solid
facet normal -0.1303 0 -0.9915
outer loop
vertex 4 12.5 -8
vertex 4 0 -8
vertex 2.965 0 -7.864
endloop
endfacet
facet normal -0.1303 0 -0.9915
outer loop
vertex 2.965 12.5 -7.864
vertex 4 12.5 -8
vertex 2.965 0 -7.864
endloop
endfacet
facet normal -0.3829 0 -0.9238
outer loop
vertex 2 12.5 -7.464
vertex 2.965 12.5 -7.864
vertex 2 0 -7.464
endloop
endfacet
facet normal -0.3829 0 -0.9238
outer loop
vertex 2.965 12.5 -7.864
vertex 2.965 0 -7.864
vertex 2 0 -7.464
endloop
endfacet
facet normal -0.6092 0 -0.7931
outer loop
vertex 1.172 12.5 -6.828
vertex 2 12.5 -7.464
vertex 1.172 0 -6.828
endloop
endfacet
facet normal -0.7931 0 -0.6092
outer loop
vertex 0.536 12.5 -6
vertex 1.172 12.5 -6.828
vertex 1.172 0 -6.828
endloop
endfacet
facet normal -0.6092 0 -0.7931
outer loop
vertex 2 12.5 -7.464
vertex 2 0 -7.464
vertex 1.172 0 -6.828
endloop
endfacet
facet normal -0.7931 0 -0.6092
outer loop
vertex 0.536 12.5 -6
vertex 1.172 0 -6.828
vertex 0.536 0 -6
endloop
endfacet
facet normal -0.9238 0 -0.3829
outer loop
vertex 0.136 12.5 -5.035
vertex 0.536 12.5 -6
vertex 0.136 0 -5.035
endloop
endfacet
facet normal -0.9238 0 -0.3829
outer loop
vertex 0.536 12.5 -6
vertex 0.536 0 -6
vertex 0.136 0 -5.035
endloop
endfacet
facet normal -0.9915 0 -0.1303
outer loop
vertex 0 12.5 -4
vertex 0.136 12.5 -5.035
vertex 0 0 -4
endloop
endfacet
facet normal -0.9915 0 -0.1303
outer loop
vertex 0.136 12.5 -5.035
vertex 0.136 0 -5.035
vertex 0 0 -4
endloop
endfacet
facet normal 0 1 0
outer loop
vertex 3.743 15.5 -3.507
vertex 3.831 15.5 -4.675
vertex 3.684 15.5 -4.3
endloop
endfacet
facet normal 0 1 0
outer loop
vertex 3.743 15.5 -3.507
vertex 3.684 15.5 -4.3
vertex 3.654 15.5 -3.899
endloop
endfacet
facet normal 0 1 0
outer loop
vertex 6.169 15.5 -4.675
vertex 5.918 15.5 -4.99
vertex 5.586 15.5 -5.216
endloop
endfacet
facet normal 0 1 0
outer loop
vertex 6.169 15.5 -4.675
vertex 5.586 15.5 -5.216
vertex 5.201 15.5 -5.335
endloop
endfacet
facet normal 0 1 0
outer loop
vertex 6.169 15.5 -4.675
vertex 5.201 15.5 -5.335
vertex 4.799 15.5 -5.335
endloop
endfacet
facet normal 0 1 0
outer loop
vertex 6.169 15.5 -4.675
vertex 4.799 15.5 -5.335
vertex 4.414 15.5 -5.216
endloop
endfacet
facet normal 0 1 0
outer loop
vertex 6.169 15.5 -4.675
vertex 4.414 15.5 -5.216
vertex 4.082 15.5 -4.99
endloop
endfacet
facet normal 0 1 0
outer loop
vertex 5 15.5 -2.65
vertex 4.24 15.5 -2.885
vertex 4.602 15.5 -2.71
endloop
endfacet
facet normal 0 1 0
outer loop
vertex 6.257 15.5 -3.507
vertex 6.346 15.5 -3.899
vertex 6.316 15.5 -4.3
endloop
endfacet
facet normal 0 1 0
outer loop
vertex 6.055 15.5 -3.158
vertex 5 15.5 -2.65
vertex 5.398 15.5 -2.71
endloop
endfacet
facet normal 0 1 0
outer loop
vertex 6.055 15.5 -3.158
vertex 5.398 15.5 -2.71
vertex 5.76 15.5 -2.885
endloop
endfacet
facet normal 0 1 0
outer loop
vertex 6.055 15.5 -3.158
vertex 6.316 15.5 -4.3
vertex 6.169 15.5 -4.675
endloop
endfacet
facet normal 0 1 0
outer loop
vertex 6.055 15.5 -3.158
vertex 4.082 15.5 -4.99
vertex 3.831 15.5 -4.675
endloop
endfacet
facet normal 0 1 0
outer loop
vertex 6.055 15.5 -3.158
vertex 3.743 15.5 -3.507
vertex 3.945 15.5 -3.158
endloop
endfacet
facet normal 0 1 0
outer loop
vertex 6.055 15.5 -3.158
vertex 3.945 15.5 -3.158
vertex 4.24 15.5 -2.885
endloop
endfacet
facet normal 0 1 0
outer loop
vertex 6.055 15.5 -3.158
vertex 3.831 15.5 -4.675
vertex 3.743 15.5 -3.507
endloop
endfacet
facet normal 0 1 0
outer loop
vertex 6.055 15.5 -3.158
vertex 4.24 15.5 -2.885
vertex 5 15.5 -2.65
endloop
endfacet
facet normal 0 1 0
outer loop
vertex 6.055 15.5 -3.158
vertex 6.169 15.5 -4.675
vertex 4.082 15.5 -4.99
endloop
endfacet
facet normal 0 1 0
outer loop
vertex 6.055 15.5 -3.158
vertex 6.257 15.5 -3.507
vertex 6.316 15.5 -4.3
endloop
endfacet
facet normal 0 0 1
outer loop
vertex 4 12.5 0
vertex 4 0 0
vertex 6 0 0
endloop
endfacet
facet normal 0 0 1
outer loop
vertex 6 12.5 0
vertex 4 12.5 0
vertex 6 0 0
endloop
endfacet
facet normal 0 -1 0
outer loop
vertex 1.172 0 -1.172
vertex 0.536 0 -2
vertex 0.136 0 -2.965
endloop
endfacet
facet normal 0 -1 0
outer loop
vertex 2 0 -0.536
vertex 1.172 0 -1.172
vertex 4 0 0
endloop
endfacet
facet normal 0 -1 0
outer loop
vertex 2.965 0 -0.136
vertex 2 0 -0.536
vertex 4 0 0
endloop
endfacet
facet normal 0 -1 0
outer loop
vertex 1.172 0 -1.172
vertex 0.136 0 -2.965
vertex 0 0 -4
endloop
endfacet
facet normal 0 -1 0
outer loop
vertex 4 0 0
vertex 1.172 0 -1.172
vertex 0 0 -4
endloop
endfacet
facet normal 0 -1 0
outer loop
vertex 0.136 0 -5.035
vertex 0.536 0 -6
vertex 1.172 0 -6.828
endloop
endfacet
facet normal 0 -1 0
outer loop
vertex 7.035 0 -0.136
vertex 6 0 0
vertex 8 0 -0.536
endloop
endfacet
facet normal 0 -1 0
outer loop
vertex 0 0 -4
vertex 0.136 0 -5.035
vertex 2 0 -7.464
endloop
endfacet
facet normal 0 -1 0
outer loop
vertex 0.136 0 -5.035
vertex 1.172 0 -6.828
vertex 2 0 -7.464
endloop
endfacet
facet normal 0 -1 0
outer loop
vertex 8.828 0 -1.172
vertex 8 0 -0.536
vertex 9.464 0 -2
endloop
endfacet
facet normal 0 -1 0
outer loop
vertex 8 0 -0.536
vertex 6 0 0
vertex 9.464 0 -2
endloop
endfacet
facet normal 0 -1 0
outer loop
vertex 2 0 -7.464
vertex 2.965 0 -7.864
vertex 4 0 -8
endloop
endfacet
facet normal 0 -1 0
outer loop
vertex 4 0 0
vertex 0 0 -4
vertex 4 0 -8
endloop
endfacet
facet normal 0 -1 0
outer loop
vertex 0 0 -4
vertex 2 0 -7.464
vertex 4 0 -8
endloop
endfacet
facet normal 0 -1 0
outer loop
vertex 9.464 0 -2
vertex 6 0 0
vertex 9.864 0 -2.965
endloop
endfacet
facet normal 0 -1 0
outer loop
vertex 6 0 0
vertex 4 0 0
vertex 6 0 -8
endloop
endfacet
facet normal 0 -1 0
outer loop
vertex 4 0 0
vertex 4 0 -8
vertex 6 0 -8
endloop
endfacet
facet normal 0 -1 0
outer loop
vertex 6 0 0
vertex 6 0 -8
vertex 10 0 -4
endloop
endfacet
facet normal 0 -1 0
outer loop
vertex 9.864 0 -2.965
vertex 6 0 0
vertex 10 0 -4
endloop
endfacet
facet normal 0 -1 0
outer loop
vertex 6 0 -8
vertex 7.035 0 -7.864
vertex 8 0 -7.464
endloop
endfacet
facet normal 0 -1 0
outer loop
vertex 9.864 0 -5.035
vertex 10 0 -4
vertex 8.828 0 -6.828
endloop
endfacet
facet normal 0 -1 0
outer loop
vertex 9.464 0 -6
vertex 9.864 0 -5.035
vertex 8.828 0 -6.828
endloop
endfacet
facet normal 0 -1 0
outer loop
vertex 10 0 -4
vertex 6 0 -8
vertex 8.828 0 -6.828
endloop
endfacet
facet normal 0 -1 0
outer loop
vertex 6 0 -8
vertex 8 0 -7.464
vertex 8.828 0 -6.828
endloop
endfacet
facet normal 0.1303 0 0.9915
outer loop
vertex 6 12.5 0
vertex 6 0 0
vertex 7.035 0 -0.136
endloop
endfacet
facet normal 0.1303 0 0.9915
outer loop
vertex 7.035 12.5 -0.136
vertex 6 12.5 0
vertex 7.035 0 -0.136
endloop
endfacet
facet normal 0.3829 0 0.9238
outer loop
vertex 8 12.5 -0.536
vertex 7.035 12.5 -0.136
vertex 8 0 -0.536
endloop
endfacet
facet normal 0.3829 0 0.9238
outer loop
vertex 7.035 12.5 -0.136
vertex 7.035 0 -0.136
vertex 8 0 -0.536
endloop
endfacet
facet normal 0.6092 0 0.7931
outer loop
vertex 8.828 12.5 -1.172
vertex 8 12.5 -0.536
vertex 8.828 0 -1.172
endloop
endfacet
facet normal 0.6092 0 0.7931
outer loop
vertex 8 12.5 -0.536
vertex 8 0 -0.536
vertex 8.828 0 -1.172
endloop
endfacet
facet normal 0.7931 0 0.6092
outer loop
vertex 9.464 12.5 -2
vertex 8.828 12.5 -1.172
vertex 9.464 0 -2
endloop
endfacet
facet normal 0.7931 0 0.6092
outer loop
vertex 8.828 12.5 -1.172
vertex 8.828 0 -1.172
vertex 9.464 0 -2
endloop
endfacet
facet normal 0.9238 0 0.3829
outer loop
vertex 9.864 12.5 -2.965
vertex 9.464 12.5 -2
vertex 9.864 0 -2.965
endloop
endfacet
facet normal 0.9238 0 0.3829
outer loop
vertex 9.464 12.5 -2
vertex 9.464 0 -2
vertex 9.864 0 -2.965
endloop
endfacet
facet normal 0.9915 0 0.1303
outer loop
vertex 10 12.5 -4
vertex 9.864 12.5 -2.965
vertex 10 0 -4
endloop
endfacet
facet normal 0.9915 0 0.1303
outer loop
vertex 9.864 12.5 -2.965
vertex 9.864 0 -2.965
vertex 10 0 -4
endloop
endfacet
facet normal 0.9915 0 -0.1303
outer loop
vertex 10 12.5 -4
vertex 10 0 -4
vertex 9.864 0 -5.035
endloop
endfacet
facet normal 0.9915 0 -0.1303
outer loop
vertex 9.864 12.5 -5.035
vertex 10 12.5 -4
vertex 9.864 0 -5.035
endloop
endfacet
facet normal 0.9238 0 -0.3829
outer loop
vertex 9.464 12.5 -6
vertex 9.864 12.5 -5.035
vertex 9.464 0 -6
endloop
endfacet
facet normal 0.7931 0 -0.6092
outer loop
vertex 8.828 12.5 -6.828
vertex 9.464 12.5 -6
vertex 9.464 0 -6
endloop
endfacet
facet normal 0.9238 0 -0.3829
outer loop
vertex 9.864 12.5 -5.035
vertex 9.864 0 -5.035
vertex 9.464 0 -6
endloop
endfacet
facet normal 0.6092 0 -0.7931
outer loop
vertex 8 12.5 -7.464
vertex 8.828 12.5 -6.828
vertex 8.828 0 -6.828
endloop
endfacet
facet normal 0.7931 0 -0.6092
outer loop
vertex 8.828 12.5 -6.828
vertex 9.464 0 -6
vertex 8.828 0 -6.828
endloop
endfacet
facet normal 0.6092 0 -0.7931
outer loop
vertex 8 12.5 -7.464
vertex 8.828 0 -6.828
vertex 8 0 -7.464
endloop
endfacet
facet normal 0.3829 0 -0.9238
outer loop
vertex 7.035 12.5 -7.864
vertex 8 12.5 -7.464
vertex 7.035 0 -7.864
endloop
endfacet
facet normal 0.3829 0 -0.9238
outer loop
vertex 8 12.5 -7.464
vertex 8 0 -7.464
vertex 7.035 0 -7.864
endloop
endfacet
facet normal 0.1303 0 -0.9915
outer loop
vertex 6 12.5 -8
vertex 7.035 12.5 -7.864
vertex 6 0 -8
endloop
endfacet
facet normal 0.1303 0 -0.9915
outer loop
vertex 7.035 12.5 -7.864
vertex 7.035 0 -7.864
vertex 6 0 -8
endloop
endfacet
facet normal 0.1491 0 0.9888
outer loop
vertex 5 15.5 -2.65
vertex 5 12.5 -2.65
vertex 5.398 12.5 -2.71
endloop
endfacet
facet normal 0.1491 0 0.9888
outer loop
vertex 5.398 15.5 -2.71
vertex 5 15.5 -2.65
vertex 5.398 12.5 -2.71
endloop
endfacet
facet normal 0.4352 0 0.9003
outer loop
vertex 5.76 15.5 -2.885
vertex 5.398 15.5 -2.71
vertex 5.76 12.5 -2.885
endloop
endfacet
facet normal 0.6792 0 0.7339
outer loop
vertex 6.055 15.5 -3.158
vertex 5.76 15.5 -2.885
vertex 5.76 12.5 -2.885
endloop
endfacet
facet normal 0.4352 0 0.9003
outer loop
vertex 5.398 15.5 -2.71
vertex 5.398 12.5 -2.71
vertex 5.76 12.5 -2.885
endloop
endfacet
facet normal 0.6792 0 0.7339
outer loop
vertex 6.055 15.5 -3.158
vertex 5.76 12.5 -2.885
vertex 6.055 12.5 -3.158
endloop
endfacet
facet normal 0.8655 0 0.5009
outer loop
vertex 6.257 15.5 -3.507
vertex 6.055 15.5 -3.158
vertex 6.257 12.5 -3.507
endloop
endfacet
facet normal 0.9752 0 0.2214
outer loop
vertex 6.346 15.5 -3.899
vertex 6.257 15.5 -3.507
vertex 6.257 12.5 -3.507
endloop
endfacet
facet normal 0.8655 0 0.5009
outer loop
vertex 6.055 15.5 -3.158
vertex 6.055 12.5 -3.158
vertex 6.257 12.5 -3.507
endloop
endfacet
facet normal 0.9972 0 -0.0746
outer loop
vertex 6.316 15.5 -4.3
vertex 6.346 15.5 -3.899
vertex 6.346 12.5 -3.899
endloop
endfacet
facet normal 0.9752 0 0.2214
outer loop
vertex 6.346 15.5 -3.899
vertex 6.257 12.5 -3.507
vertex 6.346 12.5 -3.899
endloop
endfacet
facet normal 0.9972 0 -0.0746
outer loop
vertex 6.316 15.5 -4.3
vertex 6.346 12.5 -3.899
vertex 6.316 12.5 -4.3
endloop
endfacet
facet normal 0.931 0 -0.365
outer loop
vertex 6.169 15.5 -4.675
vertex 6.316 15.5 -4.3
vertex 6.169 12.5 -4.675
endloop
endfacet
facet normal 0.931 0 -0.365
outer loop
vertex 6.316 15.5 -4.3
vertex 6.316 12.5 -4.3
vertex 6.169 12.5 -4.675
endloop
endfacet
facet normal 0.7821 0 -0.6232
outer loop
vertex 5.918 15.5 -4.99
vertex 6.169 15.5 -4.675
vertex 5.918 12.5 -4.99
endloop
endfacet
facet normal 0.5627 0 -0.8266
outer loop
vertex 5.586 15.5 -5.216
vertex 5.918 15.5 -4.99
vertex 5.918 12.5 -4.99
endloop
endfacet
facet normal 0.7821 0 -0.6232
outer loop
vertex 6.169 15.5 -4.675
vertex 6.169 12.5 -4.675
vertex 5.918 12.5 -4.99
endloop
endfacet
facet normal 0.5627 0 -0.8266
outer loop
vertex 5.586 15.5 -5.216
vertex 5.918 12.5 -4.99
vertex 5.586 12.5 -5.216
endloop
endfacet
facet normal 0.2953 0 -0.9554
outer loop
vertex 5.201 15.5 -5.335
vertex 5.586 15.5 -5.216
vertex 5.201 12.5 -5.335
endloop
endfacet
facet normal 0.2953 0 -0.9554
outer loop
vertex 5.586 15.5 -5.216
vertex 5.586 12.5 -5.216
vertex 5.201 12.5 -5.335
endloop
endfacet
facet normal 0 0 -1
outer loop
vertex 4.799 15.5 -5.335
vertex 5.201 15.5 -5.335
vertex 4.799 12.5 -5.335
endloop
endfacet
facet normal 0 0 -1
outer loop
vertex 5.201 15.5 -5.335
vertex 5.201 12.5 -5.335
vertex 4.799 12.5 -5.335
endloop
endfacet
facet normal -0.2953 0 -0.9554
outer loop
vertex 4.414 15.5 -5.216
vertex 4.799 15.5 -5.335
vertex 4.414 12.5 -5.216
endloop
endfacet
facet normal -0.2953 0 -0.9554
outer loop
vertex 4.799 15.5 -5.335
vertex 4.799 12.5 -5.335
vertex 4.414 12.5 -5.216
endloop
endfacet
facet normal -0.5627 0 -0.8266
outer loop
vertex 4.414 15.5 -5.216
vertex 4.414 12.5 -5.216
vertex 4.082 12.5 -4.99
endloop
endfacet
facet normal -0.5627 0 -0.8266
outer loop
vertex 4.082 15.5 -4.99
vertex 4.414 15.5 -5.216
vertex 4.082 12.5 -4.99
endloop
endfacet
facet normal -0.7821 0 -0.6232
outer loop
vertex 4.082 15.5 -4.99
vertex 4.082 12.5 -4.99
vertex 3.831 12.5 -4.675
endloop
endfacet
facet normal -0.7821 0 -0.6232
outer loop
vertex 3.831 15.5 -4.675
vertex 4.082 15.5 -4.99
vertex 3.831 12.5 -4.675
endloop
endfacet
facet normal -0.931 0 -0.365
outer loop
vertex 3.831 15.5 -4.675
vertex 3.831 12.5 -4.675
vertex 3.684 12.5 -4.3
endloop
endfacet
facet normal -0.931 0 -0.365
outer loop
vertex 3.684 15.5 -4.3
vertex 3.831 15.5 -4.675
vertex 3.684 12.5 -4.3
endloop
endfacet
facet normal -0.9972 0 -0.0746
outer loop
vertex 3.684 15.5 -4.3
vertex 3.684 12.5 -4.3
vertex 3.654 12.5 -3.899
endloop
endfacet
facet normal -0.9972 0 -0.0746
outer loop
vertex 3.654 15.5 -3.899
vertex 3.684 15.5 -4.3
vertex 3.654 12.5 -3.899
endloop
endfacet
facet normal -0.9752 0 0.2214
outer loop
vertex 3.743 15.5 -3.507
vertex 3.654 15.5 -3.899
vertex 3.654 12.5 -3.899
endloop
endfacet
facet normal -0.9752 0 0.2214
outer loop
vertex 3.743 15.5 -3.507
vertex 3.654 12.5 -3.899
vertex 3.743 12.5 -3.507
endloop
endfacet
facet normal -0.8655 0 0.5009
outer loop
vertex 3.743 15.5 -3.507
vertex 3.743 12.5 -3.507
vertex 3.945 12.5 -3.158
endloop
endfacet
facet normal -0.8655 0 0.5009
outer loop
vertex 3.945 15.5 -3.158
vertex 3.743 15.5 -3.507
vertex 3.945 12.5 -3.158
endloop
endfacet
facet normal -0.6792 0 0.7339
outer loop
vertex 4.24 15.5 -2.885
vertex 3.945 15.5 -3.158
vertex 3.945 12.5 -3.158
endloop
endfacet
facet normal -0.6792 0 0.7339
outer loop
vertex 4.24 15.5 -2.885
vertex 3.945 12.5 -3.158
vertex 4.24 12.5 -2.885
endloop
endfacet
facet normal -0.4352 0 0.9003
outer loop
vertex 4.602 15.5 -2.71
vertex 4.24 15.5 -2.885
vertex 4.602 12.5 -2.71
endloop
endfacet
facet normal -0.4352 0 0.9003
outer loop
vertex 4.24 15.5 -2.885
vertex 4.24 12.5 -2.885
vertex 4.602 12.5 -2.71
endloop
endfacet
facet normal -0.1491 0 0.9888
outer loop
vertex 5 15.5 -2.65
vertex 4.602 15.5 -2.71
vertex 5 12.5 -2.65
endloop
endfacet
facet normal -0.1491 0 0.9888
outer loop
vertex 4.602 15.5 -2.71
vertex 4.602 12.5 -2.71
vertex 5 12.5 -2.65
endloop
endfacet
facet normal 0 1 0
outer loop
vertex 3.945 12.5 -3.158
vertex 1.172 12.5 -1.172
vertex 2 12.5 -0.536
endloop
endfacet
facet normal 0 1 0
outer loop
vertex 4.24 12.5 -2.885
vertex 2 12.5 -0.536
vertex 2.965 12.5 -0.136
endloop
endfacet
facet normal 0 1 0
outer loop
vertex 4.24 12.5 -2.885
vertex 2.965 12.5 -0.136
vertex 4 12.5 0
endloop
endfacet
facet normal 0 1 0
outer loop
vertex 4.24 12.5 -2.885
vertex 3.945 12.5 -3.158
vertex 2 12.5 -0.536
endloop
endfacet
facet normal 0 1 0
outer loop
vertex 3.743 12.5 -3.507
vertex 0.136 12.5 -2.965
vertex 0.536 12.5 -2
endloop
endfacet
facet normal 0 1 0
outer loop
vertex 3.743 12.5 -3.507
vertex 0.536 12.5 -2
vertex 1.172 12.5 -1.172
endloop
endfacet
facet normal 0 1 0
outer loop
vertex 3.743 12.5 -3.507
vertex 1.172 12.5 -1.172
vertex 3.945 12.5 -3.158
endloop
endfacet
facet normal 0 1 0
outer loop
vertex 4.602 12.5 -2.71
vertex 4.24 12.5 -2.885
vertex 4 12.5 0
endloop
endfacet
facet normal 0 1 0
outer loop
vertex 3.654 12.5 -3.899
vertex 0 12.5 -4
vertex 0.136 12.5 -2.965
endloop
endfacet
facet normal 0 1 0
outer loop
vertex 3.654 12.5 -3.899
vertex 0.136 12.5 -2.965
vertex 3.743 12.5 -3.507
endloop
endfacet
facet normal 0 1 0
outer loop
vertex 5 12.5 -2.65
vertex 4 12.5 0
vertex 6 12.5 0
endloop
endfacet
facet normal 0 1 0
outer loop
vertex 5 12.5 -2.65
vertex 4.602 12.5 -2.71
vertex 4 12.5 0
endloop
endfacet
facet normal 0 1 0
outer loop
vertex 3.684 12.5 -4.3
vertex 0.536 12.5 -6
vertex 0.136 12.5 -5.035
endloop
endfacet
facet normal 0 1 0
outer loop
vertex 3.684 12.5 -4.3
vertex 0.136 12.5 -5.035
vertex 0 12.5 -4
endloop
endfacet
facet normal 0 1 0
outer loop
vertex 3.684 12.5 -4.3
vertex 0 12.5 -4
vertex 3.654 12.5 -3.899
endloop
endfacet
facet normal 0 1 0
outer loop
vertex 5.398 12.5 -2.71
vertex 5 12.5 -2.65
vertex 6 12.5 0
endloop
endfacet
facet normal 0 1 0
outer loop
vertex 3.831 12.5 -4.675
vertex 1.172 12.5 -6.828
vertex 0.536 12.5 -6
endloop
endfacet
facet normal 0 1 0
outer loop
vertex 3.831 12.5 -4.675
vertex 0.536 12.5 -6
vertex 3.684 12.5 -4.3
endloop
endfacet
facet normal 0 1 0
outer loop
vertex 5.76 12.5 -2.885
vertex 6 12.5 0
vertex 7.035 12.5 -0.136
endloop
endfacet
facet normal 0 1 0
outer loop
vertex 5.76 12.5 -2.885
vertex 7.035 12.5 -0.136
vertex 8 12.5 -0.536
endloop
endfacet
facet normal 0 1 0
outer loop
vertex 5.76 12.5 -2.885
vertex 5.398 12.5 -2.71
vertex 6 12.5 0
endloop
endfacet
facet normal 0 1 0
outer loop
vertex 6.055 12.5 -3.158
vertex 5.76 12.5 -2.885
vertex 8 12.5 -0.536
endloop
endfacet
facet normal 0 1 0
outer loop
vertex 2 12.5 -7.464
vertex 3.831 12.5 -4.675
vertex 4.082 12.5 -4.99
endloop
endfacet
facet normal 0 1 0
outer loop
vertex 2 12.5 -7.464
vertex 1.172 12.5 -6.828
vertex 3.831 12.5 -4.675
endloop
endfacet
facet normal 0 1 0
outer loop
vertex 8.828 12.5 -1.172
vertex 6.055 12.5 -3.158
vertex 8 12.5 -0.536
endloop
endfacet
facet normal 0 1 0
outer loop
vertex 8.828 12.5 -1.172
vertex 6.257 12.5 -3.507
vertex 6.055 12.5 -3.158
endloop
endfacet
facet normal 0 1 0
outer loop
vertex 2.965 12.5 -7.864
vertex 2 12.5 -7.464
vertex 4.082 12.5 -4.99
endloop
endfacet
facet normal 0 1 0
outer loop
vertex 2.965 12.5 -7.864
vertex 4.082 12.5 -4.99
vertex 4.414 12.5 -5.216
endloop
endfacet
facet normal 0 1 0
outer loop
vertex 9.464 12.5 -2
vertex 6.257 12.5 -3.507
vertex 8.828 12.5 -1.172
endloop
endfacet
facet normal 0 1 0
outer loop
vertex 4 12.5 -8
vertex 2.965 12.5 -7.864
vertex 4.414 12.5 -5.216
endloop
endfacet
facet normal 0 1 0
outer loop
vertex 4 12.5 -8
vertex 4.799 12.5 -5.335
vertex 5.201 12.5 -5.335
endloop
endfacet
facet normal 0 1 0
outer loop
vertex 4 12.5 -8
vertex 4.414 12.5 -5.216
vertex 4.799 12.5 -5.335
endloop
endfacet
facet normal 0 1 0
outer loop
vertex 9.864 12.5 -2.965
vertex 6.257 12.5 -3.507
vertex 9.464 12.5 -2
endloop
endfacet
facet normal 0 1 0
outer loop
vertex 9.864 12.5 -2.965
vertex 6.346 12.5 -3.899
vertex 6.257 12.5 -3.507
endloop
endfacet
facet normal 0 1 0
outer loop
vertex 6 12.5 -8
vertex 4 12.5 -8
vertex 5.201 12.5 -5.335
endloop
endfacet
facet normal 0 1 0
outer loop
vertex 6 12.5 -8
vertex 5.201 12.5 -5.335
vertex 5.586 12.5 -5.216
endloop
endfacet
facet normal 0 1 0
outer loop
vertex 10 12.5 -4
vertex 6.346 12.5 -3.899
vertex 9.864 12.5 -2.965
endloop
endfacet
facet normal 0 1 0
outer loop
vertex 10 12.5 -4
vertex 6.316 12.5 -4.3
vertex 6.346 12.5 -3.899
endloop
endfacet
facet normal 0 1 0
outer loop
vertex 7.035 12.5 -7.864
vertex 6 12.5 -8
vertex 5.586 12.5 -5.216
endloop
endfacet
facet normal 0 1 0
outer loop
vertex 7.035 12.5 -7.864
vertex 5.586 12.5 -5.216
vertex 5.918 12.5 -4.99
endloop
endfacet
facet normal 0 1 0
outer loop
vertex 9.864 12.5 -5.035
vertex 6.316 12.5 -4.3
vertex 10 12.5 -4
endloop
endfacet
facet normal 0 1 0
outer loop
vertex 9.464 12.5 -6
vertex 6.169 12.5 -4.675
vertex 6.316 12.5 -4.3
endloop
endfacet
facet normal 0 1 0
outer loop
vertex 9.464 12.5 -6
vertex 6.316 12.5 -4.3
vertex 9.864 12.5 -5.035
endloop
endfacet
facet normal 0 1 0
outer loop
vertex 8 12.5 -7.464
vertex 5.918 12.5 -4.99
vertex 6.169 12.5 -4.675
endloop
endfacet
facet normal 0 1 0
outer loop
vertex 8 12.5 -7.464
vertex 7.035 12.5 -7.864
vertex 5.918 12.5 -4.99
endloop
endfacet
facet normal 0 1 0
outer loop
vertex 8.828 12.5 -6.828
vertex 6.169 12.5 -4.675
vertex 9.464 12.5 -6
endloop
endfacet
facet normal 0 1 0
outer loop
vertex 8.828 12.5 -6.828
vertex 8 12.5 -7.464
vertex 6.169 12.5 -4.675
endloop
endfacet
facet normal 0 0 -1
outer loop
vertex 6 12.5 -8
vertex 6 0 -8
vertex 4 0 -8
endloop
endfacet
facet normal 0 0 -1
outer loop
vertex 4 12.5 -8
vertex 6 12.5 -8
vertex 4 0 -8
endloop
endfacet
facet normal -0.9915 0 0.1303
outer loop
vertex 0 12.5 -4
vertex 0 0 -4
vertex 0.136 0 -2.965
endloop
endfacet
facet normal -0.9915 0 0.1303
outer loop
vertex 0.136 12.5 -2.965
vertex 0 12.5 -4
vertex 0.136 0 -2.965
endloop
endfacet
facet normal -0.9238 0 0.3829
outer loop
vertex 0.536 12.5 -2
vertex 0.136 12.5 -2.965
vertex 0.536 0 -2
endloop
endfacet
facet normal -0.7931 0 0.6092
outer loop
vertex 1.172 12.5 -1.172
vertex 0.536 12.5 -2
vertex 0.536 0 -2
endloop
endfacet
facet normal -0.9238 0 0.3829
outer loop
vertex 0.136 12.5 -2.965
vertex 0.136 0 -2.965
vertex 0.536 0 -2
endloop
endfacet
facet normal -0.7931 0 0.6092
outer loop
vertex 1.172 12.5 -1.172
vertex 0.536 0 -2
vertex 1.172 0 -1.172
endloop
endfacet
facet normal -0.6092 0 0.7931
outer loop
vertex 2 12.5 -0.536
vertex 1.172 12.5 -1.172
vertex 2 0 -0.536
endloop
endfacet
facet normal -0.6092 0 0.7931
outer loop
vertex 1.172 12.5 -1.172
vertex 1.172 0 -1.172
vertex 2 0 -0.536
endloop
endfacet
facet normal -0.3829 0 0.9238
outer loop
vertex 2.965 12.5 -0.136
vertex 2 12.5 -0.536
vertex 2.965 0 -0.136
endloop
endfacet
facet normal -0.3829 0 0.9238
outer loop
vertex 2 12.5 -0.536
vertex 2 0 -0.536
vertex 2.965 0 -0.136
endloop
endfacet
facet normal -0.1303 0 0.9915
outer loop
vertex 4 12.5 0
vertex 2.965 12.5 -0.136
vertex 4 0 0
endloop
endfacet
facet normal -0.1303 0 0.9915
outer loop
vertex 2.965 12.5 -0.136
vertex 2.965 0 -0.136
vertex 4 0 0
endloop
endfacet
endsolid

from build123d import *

# Parameters (mm, degrees)
BOSS_EXTRU_1_DEPTH = 12.5
ESQUISSE2_R        = 1.35
BOSS_EXTRU_2_DEPTH = 3


with BuildPart() as part:
    # Esquisse1 → Boss.-Extru.1 (new body)
    with BuildSketch(Plane(origin=(0, 0, 0), x_dir=(1, 0, 0), z_dir=(0, 1, 0))):
        with BuildLine():
            ThreePointArc((0, 4), (1.171572875, 1.171572875), (4, 0))
            Line((4, 0), (6, 0))
            ThreePointArc((6, 0), (8.828427125, 1.171572875), (10, 4))
            ThreePointArc((10, 4), (8.828427125, 6.828427125), (6, 8))
            Line((6, 8), (4, 8))
            ThreePointArc((4, 8), (1.171572875, 6.828427125), (0, 4))
        make_face()
    extrude(amount=BOSS_EXTRU_1_DEPTH)

    # Esquisse2 → Boss.-Extru.2 (add)
    with BuildSketch(Plane(origin=(0, 12.5, 0), x_dir=(1, 0, 0), z_dir=(0, 1, 0))):
        with Locations(Location((5, 4, 0), (0, 0, 270))):
            Circle(ESQUISSE2_R)
    extrude(amount=BOSS_EXTRU_2_DEPTH)


solid = part.part
